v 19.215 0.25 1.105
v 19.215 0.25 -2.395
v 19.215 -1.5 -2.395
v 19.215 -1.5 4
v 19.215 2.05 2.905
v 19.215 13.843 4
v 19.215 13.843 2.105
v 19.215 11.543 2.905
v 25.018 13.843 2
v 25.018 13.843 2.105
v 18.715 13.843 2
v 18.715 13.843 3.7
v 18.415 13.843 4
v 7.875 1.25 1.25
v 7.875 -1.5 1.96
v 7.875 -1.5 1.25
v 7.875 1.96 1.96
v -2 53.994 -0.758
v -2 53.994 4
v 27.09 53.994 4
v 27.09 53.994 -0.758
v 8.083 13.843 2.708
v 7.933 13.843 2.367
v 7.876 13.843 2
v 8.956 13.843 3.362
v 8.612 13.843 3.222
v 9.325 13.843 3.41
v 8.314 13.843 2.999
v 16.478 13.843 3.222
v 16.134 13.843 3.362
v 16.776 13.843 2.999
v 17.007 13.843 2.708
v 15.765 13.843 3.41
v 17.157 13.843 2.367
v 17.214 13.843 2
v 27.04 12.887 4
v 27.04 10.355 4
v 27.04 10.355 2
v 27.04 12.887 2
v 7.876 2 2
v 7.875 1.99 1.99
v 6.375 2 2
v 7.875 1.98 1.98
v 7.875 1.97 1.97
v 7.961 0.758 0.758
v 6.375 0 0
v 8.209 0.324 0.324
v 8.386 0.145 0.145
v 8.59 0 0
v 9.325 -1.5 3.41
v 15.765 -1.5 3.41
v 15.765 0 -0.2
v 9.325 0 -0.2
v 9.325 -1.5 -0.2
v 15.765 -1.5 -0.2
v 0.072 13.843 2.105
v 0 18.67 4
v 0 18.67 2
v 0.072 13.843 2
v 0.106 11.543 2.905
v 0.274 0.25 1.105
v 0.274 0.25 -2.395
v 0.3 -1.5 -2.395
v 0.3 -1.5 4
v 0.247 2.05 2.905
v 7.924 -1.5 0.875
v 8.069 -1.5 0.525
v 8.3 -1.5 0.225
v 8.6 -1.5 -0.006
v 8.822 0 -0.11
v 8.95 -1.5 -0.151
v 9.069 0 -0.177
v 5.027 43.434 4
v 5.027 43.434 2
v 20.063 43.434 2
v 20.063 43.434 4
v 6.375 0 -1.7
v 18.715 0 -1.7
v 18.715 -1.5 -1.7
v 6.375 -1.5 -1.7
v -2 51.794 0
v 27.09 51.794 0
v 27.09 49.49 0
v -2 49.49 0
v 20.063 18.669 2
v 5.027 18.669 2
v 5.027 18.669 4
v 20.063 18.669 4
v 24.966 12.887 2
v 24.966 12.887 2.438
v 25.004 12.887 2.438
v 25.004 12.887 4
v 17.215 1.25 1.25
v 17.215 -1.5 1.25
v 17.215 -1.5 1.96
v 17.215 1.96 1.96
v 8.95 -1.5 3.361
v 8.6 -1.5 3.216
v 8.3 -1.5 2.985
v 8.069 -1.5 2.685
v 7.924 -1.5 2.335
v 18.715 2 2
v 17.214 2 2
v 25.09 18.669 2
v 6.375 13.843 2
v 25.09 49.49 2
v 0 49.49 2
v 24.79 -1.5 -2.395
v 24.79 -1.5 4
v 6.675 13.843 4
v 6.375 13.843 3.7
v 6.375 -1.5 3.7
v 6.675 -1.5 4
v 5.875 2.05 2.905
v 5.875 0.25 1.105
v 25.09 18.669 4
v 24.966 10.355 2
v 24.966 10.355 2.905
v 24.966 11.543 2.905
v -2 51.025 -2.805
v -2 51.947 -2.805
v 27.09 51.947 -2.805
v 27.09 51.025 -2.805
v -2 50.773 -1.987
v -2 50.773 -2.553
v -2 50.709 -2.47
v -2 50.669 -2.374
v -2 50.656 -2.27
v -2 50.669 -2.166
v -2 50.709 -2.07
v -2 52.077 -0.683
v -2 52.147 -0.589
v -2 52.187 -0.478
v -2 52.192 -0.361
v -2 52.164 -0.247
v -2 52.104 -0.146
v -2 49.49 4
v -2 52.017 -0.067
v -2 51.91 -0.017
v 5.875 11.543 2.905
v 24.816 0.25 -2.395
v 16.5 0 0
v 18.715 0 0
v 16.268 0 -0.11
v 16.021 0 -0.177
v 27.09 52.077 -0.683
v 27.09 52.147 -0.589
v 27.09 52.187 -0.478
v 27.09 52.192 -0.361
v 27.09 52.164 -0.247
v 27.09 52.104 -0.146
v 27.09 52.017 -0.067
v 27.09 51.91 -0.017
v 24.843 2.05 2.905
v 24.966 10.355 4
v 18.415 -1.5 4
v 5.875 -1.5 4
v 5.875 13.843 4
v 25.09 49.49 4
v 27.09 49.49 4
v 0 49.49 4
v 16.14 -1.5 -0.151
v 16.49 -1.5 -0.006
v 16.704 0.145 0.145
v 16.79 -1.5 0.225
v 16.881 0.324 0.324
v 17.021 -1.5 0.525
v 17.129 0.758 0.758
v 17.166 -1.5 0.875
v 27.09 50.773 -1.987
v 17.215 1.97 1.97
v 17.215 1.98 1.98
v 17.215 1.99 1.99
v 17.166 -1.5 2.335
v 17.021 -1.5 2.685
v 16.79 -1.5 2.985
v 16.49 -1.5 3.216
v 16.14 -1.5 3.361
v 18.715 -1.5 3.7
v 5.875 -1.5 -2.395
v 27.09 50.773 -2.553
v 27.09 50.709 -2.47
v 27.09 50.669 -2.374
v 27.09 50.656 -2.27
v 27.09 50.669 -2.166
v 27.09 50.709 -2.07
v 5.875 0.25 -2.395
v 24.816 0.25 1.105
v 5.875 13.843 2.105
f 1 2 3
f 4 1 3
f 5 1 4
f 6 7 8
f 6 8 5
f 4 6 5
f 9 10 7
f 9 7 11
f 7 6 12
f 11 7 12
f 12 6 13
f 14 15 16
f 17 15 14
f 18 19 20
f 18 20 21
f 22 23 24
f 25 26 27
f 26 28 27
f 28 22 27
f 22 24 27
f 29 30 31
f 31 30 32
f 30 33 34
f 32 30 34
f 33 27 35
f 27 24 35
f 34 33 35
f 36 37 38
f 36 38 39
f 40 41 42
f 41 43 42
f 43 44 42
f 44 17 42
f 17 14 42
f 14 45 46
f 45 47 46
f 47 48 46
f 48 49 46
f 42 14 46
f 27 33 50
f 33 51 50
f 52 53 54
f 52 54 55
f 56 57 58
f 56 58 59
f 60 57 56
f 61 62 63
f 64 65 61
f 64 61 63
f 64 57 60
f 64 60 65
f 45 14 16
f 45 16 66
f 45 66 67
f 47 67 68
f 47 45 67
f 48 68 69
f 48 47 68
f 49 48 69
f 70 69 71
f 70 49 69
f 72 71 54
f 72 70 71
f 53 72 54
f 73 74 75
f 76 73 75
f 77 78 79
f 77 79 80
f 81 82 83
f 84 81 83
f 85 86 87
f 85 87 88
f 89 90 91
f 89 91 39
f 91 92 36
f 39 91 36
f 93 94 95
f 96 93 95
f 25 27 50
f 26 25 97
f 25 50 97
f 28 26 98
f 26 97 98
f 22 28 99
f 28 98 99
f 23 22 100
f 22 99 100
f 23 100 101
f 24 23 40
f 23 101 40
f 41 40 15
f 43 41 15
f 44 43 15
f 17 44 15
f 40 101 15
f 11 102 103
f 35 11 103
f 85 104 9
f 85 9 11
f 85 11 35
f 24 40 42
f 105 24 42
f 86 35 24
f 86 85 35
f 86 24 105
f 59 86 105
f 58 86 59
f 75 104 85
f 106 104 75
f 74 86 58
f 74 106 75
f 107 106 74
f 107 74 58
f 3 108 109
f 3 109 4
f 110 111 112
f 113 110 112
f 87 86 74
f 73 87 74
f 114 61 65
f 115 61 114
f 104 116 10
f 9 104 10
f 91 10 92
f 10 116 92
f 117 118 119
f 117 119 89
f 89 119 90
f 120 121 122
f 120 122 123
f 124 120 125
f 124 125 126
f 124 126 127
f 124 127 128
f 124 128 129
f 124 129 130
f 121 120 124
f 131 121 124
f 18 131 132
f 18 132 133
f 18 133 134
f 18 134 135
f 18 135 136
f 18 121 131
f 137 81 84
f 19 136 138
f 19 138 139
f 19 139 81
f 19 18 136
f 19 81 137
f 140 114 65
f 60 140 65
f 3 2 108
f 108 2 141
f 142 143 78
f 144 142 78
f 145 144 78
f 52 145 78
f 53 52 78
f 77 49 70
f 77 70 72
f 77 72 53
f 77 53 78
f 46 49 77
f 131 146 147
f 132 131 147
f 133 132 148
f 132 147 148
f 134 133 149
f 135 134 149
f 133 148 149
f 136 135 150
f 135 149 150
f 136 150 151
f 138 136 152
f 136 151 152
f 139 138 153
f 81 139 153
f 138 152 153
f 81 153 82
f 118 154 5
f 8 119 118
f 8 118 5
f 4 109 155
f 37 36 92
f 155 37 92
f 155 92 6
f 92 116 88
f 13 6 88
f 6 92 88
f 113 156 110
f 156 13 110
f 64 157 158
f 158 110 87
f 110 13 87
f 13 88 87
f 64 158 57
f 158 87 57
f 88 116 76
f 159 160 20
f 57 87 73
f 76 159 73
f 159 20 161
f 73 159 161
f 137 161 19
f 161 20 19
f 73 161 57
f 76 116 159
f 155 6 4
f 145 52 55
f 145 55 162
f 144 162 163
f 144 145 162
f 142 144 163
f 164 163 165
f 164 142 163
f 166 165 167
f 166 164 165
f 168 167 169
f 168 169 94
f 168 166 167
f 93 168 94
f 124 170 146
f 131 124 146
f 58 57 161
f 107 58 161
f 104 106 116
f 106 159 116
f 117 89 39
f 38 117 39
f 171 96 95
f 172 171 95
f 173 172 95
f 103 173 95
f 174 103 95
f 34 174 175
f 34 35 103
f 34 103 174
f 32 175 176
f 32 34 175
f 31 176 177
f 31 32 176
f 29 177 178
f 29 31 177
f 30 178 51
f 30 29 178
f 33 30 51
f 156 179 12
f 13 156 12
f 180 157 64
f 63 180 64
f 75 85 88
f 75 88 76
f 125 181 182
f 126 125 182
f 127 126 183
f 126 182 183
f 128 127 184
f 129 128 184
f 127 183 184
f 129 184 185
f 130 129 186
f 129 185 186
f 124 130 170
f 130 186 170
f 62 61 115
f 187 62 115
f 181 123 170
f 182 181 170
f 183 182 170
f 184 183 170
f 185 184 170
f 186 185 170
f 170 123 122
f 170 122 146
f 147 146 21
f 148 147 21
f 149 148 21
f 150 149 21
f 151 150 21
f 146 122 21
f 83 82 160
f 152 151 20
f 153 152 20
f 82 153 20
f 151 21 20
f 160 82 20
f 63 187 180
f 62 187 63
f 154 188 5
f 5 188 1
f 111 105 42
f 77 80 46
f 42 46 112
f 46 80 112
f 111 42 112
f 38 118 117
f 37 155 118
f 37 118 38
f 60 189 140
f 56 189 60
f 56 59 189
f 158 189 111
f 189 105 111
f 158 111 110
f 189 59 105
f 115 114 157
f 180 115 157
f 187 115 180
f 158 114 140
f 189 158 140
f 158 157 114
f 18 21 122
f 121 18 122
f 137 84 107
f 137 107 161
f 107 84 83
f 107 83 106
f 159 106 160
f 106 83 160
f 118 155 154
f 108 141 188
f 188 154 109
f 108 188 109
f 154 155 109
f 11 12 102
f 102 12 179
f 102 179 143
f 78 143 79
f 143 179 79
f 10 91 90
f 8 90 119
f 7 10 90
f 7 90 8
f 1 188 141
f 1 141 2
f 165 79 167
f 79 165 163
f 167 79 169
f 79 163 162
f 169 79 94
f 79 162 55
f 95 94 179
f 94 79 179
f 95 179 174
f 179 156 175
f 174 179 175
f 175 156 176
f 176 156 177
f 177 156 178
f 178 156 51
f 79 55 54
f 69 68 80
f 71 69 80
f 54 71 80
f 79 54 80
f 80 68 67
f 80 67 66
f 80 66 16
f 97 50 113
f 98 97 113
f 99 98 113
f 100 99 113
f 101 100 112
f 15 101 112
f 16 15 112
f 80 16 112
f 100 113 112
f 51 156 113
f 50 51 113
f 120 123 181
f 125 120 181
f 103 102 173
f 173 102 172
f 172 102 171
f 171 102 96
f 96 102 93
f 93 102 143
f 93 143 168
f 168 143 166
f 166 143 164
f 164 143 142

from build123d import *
from OCP.BRepFilletAPI import BRepFilletAPI_MakeChamfer

# Parameters (mm, degrees)
BOSS_EXTRUDE1_START  = 2
SKETCH1_W            = 17.5768
SKETCH1_H            = 31.241999999999997
SKETCH1_W_2          = 15.036799999999998
SKETCH1_H_2          = 24.764999999999997
BOSS_EXTRUDE1_DEPTH  = 2
BOSS_EXTRUDE2_START  = 2
BOSS_EXTRUDE2_DEPTH  = 29.09
BOSS_EXTRUDE3_DEPTH  = 1.5
BOSS_EXTRUDE4_DEPTH  = 13.843
BOSS_EXTRUDE5_DEPTH  = 1.095
BOSS_EXTRUDE6_DEPTH  = 1.095
BOSS_EXTRUDE7_DEPTH  = 2
CHAMFER1_SIZE        = 2.3
CHAMFER1_SIZE2       = 0.8
BOSS_EXTRUDE9_DEPTH  = 5.299999999999998
CHAMFER2_SIZE        = 1.8
CUT_EXTRUDE1_DEPTH   = 0.25
CUT_EXTRUDE2_DEPTH   = 0.25
CUT_EXTRUDE3_REACH   = 62.791
SKETCH15_W           = 2.073672467648368
SKETCH15_H           = 2.532
BOSS_EXTRUDE10_DEPTH = 2
CHAMFER3_SIZE        = 0.3
CHAMFER4_SIZE        = 2


with BuildPart() as part:
    # Sketch1 → Boss-Extrude1 (new body)
    with BuildSketch(Plane.XY.offset(BOSS_EXTRUDE1_START)):
        with Locations((12.544999999999998, 29.464000000000002)):
            Rectangle(SKETCH1_W, SKETCH1_H)
        with Locations((12.544999999999998, 31.051499999999997)):
            Rectangle(SKETCH1_W_2, SKETCH1_H_2, mode=Mode.SUBTRACT)
    extrude(amount=BOSS_EXTRUDE1_DEPTH)



with BuildPart() as body_2:
    # Sketch2 → Boss-Extrude2 (new body)
    with BuildSketch(Plane(origin=(25.09, 5.28e-15, 0), x_dir=(0, 0, -1), z_dir=(1, 2.1e-16, 0)).offset(BOSS_EXTRUDE2_START)):
        with BuildLine():
            Line((0, 51.489999999999995), (2.4e-16, 49.489999999999995))
            Line((2.4e-16, 49.489999999999995), (-4, 49.489999999999995))
            Line((-4, 49.489999999999995), (-4.000000000000001, 53.99431457505075))
            Line((-4.000000000000001, 53.99431457505075), (0.7579894972000346, 53.99431457505075))
            Line((0.7579894972000346, 53.99431457505075), (2.805084072136604, 51.947220000114164))
            Line((2.805084072136604, 51.947220000114164), (2.805084072136603, 51.02508407213661))
            Line((2.805084072136603, 51.02508407213661), (2.552842712474611, 50.77284271247461))
            ThreePointArc((2.552842712474611, 50.77284271247461), (2.2699999999999894, 50.65568542494923), (1.9871572875253678, 50.77284271247461))
            Line((1.9871572875253678, 50.77284271247461), (1.27, 51.489999999999995))
            Line((1.27, 51.489999999999995), (0.6828427124746198, 52.07715728752538))
            ThreePointArc((0.6828427124746198, 52.07715728752538), (0.24692662705396132, 52.163866388055276), (0, 51.794314575050755))
            Line((0, 51.794314575050755), (0, 51.489999999999995))
        make_face()
    extrude(amount=-BOSS_EXTRUDE2_DEPTH)


with BuildPart() as body_3:
    # Sketch4 → Boss-Extrude3 (new body)
    with BuildSketch(Plane.XZ):
        Polygon((6.374999999999999, 4), (18.715, 4), (18.715, -1.7), (6.374999999999999, -1.699999999999999), align=None)
        with BuildLine():
            Line((17.215, 1.2499999999999993), (17.214999999999996, 1.96))
            ThreePointArc((17.214999999999996, 1.96), (16.79030483272049, 2.985304832720491), (15.765, 3.409999999999999))
            Line((15.765, 3.409999999999999), (9.325, 3.41))
            ThreePointArc((9.325, 3.41), (8.299695167279506, 2.985304832720494), (7.875, 1.96))
            Line((7.875, 1.96), (7.874999999999998, 1.2499999999999998))
            ThreePointArc((7.874999999999998, 1.2499999999999998), (8.299695167279504, 0.22469516727950523), (9.325, -0.20000000000000095))
            Line((9.325, -0.20000000000000095), (15.765, -0.19999999999999923))
            ThreePointArc((15.765, -0.19999999999999923), (16.790304832720494, 0.22469516727950656), (17.215, 1.2499999999999993))
        make_face(mode=Mode.SUBTRACT)
    extrude(amount=BOSS_EXTRUDE3_DEPTH)


with BuildPart() as part_1:
    add(part.part)

    add(body_3.part)  # Boss-Extrude4 merges body 3
    # Sketch5 → Boss-Extrude4 (add)
    with BuildSketch(Plane(origin=(0, 0, 0), x_dir=(1, 1.4e-16, 0), z_dir=(-1.4e-16, 1, 0))):
        with BuildLine():
            ThreePointArc((9.325, -3.41), (8.31393620379325, -2.9993507588874895), (7.875551829143242, -2))
            Line((7.875551829143242, -2), (6.374999999999999, -2))
            Line((6.374999999999999, -2), (6.374999999999999, -4))
            Line((6.375, -4), (18.715, -4))
            Line((18.715, -4), (18.715, -2))
            Line((18.715, -2), (17.214448170856755, -2))
            ThreePointArc((17.214448170856755, -2), (16.77606379620675, -2.9993507588874895), (15.765, -3.4099999999999993))
            Line((15.765, -3.409999999999999), (9.325, -3.4099999999999997))
        make_face()
    extrude(amount=BOSS_EXTRUDE4_DEPTH)

    # Sketch6 → Boss-Extrude5 (add)
    with BuildSketch(Plane.XY.offset(2.905)):
        Polygon((6.1249999999999964, 13.843), (6.124999999999998, -1.4999999999999991), (1.821e-14, -1.5), (1.431e-14, 13.843), align=None)
    extrude(amount=BOSS_EXTRUDE5_DEPTH)

    # Sketch9 → Boss-Extrude6 (add)
    with BuildSketch(Plane.XY.offset(2.905)):
        Polygon((18.965, 13.843), (25.09, 13.843), (25.09, -1.4999999999999973), (18.965000000000003, -1.4999999999999973), align=None)
    extrude(amount=BOSS_EXTRUDE6_DEPTH)


    add(body_2.part)  # Boss-Extrude7 merges body 2
    # Sketch10 → Boss-Extrude7 (add)
    with BuildSketch(Plane.XY.offset(4)):
        Polygon((25.09, 49.489999999999995), (25.09, 13.843), (21.333399999999997, 13.843), (21.333399999999997, 45.085), (3.7566, 45.085), (3.7566, 13.843), (1.431e-14, 13.843), (-8.67e-15, 49.489999999999995), align=None)
    extrude(amount=-BOSS_EXTRUDE7_DEPTH)

    # Chamfer1: one chamfer whose edges measure the first distance from different faces: ONE call of the kernel's chamfer builder (chamfer() names one face for all edges)
    chamfer1_edges_1 = [part_1.edges().sort_by_distance(p)[0] for p in [
        (22.0275, 13.843, 2.905),
    ]]
    chamfer1_side_1 = [part_1.faces().sort_by_distance(p)[0] for p in [
        (22.0275, 6.171500000000002, 2.905),
    ]]
    chamfer1_edges_2 = [part_1.edges().sort_by_distance(p)[0] for p in [
        (3.0625000000000053, 13.843, 2.905),
    ]]
    chamfer1_side_2 = [part_1.faces().sort_by_distance(p)[0] for p in [
        (3.0625000000000067, 6.1715, 2.9050000000000002),
    ]]
    chamfer1 = BRepFilletAPI_MakeChamfer(part_1.part.solid().wrapped)
    for e in chamfer1_edges_1:
        chamfer1.Add(CHAMFER1_SIZE, CHAMFER1_SIZE2, e.wrapped, chamfer1_side_1[0].wrapped)  # the first distance lies on this face
    for e in chamfer1_edges_2:
        chamfer1.Add(CHAMFER1_SIZE, CHAMFER1_SIZE2, e.wrapped, chamfer1_side_2[0].wrapped)  # the first distance lies on this face
    add(Compound.cast(chamfer1.Shape()), mode=Mode.REPLACE)

    # Sketch11 → Boss-Extrude9 (add)
    with BuildSketch(Plane(origin=(0, 0, 2.905), x_dir=(-1, 0, 0), z_dir=(0, 0, -1))):
        Polygon((-6.124999999999998, -1.4999999999999991), (-1.779e-14, -1.4999999999999991), (-1.49e-14, 0.2500000000000002), (-6.124999999999998, 0.2500000000000009), align=None)
        Polygon((-18.965000000000003, -1.4999999999999973), (-25.09, -1.4999999999999973), (-25.09, 0.25000000000000194), (-18.965000000000003, 0.25000000000000266), align=None)
    extrude(amount=BOSS_EXTRUDE9_DEPTH)

    # Chamfer2
    chamfer2_edges = [part_1.edges().sort_by_distance(p)[0] for p in [
        (3.0625000000000067, 0.25000000000000056, 2.905),
        (22.027500000000003, 0.2500000000000023, 2.905),
    ]]
    chamfer(chamfer2_edges, length=CHAMFER2_SIZE)

    # Sketch12 → Cut-Extrude1 (cut)
    with BuildSketch(Plane(origin=(6.124999999999998, 6.9e-16, 0), x_dir=(0, 0, -1), z_dir=(1, 1.1e-16, 0))):
        Polygon((-4, 13.843), (-4, -1.4999999999999998), (2.3949999999999987, -1.4999999999999998), (2.3949999999999987, 0.25000000000000017), (-1.1049999999999898, 0.25000000000000017), (-2.905, 2.0499999999999883), (-2.905, 11.543000000000012), (-2.104999999999996, 13.843), align=None)
    extrude(amount=-CUT_EXTRUDE1_DEPTH, mode=Mode.SUBTRACT)

    # Sketch13 → Cut-Extrude2 (cut)
    with BuildSketch(Plane.ZY.offset(-18.965000000000003)):
        Polygon((4, -1.5000000000000018), (4, 13.842999999999996), (2.104999999999996, 13.842999999999996), (2.905, 11.543000000000008), (2.905, 2.04999999999999), (1.1049999999999898, 0.2499999999999984), (-2.3949999999999987, 0.2499999999999984), (-2.3949999999999987, -1.5000000000000018), align=None)
    extrude(amount=-CUT_EXTRUDE2_DEPTH, mode=Mode.SUBTRACT)

    # Cut-Extrude3: up to this face of the body (flat: up to its plane)
    cut_extrude3_end = Plane(part_1.part.faces().sort_by_distance((2.9375, -0.625, -2.395))[0])
    # Sketch14 → Cut-Extrude3 (cut, up to the picked face)
    with BuildSketch(Plane.XY.offset(3.9999999999999907), mode=Mode.PRIVATE) as cut_extrude3_sk1:
        Polygon((25.09, 18.669), (24.79, -1.4999999999999967), (25.09, -1.4999999999999967), align=None)
    cut_extrude3_tool1 = split(extrude(cut_extrude3_sk1.sketch, amount=-CUT_EXTRUDE3_REACH, mode=Mode.PRIVATE), bisect_by=cut_extrude3_end, keep=Keep.BOTH, mode=Mode.PRIVATE)
    # Sketch14 → Cut-Extrude3 (cut, up to the picked face)
    with BuildSketch(Plane.XY.offset(3.9999999999999907), mode=Mode.PRIVATE) as cut_extrude3_sk2:
        Polygon((-1.119e-14, 18.669755162923135), (0.3000000000000182, -1.4999999999999993), (1.821e-14, -1.4999999999999991), align=None)
    cut_extrude3_tool2 = split(extrude(cut_extrude3_sk2.sketch, amount=-CUT_EXTRUDE3_REACH, mode=Mode.PRIVATE), bisect_by=cut_extrude3_end, keep=Keep.BOTH, mode=Mode.PRIVATE)
    add(cut_extrude3_tool1.solids().sort_by(Axis((24.99, 5.223, 4), (0, 0, -1)))[0], mode=Mode.SUBTRACT)
    add(cut_extrude3_tool2.solids().sort_by(Axis((0.1, 5.223252, 4), (0, 0, -1)))[0], mode=Mode.SUBTRACT)

    # Sketch15 → Boss-Extrude10 (add)
    with BuildSketch(Plane.XY.offset(3.9999999999999907)):
        with Locations((26.00316376617581, 11.620500000000002)):
            Rectangle(SKETCH15_W, SKETCH15_H)
    extrude(amount=-BOSS_EXTRUDE10_DEPTH)

    # Chamfer3
    chamfer3_edges = [part_1.edges().sort_by_distance(p)[0] for p in [
        (6.374999999999998, 6.171500000000002, 4),
        (18.714999999999996, 6.171500000000003, 4),
    ]]
    chamfer(chamfer3_edges, length=CHAMFER3_SIZE)

    # Chamfer4
    chamfer4_edges = [part_1.edges().sort_by_distance(p)[0] for p in [
        (7.1252759145716205, 1e-15, 2),
        (17.96472408542838, 2.53e-15, 2),
    ]]
    chamfer(chamfer4_edges, length=CHAMFER4_SIZE)


solid = part_1.part
